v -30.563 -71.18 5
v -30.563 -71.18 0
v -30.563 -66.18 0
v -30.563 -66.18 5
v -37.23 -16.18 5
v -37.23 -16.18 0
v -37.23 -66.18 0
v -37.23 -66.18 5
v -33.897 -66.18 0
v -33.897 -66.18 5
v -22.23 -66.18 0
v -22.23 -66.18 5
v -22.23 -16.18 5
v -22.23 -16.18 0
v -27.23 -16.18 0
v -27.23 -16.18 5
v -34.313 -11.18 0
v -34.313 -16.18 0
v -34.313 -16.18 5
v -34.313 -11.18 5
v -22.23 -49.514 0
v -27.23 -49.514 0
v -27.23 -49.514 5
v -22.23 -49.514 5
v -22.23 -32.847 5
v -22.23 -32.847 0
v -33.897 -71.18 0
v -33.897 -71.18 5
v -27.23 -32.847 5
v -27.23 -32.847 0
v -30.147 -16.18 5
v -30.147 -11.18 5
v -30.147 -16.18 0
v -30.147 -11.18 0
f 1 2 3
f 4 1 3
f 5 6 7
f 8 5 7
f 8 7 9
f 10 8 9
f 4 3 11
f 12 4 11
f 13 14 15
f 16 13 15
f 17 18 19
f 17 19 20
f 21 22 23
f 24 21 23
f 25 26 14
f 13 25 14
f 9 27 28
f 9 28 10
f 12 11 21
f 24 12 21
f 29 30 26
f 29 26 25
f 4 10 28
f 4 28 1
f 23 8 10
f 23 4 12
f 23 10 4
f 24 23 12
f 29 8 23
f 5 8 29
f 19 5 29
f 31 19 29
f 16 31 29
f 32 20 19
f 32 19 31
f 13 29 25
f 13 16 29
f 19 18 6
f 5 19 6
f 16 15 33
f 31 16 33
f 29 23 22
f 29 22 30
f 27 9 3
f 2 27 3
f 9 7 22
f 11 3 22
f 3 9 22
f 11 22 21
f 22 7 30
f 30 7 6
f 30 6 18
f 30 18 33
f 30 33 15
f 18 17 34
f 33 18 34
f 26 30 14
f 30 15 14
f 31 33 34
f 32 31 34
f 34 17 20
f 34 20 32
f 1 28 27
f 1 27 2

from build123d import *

# Parameters (mm, degrees)
SKETCH1_W           = 4.166666667
SKETCH1_H           = 5
SKETCH1_W_2         = 3.333333333
BOSS_EXTRUDE1_DEPTH = 5
CAVITY1_START       = -27.230031218
CAVITY1_OUTLINE_W   = 16.666666667
CAVITY1_OUTLINE_H   = 5
CAVITY1_DEPTH       = 5


# Read off the part's stored shape, not the designer's step: Cavity1
with BuildPart() as part:
    # Sketch1 → Boss-Extrude1 (new body)
    with BuildSketch(Plane.XY):
        with Locations((-32.230031219, -13.680003411)):
            Rectangle(SKETCH1_W, SKETCH1_H)
        Polygon((-34.313364552, -21.180003411), (-34.313364552, -16.180003411), (-37.230031218, -16.180003411), (-37.230031218, -66.180003411), (-33.896697885, -66.180003411), (-33.896697885, -61.180003411), (-30.563364552, -61.180003411), (-30.563364552, -66.180003411), (-27.230031218, -66.180003411), (-27.230031218, -16.180003411), (-30.146697885, -16.180003411), (-30.146697885, -21.180003411), align=None)
        with Locations((-32.230031219, -18.680003411)):
            Rectangle(SKETCH1_W, SKETCH1_H)
        Polygon((-22.230031218, -16.180335931), (-27.230031218, -16.180003411), (-27.230031218, -66.180003411), (-22.230031218, -66.180003411), align=None)
        with Locations((-32.230031219, -63.680003411)):
            Rectangle(SKETCH1_W_2, SKETCH1_H)
        with Locations((-32.230031219, -68.680003411)):
            Rectangle(SKETCH1_W_2, SKETCH1_H)
    extrude(amount=BOSS_EXTRUDE1_DEPTH)

    # Cavity1 outline → Cavity1 (cut)
    with BuildSketch(Plane.YZ.offset(CAVITY1_START)):
        with Locations((-41.180335932, 2.5)):
            Rectangle(CAVITY1_OUTLINE_W, CAVITY1_OUTLINE_H)
    extrude(amount=CAVITY1_DEPTH, mode=Mode.SUBTRACT)


solid = part.part
